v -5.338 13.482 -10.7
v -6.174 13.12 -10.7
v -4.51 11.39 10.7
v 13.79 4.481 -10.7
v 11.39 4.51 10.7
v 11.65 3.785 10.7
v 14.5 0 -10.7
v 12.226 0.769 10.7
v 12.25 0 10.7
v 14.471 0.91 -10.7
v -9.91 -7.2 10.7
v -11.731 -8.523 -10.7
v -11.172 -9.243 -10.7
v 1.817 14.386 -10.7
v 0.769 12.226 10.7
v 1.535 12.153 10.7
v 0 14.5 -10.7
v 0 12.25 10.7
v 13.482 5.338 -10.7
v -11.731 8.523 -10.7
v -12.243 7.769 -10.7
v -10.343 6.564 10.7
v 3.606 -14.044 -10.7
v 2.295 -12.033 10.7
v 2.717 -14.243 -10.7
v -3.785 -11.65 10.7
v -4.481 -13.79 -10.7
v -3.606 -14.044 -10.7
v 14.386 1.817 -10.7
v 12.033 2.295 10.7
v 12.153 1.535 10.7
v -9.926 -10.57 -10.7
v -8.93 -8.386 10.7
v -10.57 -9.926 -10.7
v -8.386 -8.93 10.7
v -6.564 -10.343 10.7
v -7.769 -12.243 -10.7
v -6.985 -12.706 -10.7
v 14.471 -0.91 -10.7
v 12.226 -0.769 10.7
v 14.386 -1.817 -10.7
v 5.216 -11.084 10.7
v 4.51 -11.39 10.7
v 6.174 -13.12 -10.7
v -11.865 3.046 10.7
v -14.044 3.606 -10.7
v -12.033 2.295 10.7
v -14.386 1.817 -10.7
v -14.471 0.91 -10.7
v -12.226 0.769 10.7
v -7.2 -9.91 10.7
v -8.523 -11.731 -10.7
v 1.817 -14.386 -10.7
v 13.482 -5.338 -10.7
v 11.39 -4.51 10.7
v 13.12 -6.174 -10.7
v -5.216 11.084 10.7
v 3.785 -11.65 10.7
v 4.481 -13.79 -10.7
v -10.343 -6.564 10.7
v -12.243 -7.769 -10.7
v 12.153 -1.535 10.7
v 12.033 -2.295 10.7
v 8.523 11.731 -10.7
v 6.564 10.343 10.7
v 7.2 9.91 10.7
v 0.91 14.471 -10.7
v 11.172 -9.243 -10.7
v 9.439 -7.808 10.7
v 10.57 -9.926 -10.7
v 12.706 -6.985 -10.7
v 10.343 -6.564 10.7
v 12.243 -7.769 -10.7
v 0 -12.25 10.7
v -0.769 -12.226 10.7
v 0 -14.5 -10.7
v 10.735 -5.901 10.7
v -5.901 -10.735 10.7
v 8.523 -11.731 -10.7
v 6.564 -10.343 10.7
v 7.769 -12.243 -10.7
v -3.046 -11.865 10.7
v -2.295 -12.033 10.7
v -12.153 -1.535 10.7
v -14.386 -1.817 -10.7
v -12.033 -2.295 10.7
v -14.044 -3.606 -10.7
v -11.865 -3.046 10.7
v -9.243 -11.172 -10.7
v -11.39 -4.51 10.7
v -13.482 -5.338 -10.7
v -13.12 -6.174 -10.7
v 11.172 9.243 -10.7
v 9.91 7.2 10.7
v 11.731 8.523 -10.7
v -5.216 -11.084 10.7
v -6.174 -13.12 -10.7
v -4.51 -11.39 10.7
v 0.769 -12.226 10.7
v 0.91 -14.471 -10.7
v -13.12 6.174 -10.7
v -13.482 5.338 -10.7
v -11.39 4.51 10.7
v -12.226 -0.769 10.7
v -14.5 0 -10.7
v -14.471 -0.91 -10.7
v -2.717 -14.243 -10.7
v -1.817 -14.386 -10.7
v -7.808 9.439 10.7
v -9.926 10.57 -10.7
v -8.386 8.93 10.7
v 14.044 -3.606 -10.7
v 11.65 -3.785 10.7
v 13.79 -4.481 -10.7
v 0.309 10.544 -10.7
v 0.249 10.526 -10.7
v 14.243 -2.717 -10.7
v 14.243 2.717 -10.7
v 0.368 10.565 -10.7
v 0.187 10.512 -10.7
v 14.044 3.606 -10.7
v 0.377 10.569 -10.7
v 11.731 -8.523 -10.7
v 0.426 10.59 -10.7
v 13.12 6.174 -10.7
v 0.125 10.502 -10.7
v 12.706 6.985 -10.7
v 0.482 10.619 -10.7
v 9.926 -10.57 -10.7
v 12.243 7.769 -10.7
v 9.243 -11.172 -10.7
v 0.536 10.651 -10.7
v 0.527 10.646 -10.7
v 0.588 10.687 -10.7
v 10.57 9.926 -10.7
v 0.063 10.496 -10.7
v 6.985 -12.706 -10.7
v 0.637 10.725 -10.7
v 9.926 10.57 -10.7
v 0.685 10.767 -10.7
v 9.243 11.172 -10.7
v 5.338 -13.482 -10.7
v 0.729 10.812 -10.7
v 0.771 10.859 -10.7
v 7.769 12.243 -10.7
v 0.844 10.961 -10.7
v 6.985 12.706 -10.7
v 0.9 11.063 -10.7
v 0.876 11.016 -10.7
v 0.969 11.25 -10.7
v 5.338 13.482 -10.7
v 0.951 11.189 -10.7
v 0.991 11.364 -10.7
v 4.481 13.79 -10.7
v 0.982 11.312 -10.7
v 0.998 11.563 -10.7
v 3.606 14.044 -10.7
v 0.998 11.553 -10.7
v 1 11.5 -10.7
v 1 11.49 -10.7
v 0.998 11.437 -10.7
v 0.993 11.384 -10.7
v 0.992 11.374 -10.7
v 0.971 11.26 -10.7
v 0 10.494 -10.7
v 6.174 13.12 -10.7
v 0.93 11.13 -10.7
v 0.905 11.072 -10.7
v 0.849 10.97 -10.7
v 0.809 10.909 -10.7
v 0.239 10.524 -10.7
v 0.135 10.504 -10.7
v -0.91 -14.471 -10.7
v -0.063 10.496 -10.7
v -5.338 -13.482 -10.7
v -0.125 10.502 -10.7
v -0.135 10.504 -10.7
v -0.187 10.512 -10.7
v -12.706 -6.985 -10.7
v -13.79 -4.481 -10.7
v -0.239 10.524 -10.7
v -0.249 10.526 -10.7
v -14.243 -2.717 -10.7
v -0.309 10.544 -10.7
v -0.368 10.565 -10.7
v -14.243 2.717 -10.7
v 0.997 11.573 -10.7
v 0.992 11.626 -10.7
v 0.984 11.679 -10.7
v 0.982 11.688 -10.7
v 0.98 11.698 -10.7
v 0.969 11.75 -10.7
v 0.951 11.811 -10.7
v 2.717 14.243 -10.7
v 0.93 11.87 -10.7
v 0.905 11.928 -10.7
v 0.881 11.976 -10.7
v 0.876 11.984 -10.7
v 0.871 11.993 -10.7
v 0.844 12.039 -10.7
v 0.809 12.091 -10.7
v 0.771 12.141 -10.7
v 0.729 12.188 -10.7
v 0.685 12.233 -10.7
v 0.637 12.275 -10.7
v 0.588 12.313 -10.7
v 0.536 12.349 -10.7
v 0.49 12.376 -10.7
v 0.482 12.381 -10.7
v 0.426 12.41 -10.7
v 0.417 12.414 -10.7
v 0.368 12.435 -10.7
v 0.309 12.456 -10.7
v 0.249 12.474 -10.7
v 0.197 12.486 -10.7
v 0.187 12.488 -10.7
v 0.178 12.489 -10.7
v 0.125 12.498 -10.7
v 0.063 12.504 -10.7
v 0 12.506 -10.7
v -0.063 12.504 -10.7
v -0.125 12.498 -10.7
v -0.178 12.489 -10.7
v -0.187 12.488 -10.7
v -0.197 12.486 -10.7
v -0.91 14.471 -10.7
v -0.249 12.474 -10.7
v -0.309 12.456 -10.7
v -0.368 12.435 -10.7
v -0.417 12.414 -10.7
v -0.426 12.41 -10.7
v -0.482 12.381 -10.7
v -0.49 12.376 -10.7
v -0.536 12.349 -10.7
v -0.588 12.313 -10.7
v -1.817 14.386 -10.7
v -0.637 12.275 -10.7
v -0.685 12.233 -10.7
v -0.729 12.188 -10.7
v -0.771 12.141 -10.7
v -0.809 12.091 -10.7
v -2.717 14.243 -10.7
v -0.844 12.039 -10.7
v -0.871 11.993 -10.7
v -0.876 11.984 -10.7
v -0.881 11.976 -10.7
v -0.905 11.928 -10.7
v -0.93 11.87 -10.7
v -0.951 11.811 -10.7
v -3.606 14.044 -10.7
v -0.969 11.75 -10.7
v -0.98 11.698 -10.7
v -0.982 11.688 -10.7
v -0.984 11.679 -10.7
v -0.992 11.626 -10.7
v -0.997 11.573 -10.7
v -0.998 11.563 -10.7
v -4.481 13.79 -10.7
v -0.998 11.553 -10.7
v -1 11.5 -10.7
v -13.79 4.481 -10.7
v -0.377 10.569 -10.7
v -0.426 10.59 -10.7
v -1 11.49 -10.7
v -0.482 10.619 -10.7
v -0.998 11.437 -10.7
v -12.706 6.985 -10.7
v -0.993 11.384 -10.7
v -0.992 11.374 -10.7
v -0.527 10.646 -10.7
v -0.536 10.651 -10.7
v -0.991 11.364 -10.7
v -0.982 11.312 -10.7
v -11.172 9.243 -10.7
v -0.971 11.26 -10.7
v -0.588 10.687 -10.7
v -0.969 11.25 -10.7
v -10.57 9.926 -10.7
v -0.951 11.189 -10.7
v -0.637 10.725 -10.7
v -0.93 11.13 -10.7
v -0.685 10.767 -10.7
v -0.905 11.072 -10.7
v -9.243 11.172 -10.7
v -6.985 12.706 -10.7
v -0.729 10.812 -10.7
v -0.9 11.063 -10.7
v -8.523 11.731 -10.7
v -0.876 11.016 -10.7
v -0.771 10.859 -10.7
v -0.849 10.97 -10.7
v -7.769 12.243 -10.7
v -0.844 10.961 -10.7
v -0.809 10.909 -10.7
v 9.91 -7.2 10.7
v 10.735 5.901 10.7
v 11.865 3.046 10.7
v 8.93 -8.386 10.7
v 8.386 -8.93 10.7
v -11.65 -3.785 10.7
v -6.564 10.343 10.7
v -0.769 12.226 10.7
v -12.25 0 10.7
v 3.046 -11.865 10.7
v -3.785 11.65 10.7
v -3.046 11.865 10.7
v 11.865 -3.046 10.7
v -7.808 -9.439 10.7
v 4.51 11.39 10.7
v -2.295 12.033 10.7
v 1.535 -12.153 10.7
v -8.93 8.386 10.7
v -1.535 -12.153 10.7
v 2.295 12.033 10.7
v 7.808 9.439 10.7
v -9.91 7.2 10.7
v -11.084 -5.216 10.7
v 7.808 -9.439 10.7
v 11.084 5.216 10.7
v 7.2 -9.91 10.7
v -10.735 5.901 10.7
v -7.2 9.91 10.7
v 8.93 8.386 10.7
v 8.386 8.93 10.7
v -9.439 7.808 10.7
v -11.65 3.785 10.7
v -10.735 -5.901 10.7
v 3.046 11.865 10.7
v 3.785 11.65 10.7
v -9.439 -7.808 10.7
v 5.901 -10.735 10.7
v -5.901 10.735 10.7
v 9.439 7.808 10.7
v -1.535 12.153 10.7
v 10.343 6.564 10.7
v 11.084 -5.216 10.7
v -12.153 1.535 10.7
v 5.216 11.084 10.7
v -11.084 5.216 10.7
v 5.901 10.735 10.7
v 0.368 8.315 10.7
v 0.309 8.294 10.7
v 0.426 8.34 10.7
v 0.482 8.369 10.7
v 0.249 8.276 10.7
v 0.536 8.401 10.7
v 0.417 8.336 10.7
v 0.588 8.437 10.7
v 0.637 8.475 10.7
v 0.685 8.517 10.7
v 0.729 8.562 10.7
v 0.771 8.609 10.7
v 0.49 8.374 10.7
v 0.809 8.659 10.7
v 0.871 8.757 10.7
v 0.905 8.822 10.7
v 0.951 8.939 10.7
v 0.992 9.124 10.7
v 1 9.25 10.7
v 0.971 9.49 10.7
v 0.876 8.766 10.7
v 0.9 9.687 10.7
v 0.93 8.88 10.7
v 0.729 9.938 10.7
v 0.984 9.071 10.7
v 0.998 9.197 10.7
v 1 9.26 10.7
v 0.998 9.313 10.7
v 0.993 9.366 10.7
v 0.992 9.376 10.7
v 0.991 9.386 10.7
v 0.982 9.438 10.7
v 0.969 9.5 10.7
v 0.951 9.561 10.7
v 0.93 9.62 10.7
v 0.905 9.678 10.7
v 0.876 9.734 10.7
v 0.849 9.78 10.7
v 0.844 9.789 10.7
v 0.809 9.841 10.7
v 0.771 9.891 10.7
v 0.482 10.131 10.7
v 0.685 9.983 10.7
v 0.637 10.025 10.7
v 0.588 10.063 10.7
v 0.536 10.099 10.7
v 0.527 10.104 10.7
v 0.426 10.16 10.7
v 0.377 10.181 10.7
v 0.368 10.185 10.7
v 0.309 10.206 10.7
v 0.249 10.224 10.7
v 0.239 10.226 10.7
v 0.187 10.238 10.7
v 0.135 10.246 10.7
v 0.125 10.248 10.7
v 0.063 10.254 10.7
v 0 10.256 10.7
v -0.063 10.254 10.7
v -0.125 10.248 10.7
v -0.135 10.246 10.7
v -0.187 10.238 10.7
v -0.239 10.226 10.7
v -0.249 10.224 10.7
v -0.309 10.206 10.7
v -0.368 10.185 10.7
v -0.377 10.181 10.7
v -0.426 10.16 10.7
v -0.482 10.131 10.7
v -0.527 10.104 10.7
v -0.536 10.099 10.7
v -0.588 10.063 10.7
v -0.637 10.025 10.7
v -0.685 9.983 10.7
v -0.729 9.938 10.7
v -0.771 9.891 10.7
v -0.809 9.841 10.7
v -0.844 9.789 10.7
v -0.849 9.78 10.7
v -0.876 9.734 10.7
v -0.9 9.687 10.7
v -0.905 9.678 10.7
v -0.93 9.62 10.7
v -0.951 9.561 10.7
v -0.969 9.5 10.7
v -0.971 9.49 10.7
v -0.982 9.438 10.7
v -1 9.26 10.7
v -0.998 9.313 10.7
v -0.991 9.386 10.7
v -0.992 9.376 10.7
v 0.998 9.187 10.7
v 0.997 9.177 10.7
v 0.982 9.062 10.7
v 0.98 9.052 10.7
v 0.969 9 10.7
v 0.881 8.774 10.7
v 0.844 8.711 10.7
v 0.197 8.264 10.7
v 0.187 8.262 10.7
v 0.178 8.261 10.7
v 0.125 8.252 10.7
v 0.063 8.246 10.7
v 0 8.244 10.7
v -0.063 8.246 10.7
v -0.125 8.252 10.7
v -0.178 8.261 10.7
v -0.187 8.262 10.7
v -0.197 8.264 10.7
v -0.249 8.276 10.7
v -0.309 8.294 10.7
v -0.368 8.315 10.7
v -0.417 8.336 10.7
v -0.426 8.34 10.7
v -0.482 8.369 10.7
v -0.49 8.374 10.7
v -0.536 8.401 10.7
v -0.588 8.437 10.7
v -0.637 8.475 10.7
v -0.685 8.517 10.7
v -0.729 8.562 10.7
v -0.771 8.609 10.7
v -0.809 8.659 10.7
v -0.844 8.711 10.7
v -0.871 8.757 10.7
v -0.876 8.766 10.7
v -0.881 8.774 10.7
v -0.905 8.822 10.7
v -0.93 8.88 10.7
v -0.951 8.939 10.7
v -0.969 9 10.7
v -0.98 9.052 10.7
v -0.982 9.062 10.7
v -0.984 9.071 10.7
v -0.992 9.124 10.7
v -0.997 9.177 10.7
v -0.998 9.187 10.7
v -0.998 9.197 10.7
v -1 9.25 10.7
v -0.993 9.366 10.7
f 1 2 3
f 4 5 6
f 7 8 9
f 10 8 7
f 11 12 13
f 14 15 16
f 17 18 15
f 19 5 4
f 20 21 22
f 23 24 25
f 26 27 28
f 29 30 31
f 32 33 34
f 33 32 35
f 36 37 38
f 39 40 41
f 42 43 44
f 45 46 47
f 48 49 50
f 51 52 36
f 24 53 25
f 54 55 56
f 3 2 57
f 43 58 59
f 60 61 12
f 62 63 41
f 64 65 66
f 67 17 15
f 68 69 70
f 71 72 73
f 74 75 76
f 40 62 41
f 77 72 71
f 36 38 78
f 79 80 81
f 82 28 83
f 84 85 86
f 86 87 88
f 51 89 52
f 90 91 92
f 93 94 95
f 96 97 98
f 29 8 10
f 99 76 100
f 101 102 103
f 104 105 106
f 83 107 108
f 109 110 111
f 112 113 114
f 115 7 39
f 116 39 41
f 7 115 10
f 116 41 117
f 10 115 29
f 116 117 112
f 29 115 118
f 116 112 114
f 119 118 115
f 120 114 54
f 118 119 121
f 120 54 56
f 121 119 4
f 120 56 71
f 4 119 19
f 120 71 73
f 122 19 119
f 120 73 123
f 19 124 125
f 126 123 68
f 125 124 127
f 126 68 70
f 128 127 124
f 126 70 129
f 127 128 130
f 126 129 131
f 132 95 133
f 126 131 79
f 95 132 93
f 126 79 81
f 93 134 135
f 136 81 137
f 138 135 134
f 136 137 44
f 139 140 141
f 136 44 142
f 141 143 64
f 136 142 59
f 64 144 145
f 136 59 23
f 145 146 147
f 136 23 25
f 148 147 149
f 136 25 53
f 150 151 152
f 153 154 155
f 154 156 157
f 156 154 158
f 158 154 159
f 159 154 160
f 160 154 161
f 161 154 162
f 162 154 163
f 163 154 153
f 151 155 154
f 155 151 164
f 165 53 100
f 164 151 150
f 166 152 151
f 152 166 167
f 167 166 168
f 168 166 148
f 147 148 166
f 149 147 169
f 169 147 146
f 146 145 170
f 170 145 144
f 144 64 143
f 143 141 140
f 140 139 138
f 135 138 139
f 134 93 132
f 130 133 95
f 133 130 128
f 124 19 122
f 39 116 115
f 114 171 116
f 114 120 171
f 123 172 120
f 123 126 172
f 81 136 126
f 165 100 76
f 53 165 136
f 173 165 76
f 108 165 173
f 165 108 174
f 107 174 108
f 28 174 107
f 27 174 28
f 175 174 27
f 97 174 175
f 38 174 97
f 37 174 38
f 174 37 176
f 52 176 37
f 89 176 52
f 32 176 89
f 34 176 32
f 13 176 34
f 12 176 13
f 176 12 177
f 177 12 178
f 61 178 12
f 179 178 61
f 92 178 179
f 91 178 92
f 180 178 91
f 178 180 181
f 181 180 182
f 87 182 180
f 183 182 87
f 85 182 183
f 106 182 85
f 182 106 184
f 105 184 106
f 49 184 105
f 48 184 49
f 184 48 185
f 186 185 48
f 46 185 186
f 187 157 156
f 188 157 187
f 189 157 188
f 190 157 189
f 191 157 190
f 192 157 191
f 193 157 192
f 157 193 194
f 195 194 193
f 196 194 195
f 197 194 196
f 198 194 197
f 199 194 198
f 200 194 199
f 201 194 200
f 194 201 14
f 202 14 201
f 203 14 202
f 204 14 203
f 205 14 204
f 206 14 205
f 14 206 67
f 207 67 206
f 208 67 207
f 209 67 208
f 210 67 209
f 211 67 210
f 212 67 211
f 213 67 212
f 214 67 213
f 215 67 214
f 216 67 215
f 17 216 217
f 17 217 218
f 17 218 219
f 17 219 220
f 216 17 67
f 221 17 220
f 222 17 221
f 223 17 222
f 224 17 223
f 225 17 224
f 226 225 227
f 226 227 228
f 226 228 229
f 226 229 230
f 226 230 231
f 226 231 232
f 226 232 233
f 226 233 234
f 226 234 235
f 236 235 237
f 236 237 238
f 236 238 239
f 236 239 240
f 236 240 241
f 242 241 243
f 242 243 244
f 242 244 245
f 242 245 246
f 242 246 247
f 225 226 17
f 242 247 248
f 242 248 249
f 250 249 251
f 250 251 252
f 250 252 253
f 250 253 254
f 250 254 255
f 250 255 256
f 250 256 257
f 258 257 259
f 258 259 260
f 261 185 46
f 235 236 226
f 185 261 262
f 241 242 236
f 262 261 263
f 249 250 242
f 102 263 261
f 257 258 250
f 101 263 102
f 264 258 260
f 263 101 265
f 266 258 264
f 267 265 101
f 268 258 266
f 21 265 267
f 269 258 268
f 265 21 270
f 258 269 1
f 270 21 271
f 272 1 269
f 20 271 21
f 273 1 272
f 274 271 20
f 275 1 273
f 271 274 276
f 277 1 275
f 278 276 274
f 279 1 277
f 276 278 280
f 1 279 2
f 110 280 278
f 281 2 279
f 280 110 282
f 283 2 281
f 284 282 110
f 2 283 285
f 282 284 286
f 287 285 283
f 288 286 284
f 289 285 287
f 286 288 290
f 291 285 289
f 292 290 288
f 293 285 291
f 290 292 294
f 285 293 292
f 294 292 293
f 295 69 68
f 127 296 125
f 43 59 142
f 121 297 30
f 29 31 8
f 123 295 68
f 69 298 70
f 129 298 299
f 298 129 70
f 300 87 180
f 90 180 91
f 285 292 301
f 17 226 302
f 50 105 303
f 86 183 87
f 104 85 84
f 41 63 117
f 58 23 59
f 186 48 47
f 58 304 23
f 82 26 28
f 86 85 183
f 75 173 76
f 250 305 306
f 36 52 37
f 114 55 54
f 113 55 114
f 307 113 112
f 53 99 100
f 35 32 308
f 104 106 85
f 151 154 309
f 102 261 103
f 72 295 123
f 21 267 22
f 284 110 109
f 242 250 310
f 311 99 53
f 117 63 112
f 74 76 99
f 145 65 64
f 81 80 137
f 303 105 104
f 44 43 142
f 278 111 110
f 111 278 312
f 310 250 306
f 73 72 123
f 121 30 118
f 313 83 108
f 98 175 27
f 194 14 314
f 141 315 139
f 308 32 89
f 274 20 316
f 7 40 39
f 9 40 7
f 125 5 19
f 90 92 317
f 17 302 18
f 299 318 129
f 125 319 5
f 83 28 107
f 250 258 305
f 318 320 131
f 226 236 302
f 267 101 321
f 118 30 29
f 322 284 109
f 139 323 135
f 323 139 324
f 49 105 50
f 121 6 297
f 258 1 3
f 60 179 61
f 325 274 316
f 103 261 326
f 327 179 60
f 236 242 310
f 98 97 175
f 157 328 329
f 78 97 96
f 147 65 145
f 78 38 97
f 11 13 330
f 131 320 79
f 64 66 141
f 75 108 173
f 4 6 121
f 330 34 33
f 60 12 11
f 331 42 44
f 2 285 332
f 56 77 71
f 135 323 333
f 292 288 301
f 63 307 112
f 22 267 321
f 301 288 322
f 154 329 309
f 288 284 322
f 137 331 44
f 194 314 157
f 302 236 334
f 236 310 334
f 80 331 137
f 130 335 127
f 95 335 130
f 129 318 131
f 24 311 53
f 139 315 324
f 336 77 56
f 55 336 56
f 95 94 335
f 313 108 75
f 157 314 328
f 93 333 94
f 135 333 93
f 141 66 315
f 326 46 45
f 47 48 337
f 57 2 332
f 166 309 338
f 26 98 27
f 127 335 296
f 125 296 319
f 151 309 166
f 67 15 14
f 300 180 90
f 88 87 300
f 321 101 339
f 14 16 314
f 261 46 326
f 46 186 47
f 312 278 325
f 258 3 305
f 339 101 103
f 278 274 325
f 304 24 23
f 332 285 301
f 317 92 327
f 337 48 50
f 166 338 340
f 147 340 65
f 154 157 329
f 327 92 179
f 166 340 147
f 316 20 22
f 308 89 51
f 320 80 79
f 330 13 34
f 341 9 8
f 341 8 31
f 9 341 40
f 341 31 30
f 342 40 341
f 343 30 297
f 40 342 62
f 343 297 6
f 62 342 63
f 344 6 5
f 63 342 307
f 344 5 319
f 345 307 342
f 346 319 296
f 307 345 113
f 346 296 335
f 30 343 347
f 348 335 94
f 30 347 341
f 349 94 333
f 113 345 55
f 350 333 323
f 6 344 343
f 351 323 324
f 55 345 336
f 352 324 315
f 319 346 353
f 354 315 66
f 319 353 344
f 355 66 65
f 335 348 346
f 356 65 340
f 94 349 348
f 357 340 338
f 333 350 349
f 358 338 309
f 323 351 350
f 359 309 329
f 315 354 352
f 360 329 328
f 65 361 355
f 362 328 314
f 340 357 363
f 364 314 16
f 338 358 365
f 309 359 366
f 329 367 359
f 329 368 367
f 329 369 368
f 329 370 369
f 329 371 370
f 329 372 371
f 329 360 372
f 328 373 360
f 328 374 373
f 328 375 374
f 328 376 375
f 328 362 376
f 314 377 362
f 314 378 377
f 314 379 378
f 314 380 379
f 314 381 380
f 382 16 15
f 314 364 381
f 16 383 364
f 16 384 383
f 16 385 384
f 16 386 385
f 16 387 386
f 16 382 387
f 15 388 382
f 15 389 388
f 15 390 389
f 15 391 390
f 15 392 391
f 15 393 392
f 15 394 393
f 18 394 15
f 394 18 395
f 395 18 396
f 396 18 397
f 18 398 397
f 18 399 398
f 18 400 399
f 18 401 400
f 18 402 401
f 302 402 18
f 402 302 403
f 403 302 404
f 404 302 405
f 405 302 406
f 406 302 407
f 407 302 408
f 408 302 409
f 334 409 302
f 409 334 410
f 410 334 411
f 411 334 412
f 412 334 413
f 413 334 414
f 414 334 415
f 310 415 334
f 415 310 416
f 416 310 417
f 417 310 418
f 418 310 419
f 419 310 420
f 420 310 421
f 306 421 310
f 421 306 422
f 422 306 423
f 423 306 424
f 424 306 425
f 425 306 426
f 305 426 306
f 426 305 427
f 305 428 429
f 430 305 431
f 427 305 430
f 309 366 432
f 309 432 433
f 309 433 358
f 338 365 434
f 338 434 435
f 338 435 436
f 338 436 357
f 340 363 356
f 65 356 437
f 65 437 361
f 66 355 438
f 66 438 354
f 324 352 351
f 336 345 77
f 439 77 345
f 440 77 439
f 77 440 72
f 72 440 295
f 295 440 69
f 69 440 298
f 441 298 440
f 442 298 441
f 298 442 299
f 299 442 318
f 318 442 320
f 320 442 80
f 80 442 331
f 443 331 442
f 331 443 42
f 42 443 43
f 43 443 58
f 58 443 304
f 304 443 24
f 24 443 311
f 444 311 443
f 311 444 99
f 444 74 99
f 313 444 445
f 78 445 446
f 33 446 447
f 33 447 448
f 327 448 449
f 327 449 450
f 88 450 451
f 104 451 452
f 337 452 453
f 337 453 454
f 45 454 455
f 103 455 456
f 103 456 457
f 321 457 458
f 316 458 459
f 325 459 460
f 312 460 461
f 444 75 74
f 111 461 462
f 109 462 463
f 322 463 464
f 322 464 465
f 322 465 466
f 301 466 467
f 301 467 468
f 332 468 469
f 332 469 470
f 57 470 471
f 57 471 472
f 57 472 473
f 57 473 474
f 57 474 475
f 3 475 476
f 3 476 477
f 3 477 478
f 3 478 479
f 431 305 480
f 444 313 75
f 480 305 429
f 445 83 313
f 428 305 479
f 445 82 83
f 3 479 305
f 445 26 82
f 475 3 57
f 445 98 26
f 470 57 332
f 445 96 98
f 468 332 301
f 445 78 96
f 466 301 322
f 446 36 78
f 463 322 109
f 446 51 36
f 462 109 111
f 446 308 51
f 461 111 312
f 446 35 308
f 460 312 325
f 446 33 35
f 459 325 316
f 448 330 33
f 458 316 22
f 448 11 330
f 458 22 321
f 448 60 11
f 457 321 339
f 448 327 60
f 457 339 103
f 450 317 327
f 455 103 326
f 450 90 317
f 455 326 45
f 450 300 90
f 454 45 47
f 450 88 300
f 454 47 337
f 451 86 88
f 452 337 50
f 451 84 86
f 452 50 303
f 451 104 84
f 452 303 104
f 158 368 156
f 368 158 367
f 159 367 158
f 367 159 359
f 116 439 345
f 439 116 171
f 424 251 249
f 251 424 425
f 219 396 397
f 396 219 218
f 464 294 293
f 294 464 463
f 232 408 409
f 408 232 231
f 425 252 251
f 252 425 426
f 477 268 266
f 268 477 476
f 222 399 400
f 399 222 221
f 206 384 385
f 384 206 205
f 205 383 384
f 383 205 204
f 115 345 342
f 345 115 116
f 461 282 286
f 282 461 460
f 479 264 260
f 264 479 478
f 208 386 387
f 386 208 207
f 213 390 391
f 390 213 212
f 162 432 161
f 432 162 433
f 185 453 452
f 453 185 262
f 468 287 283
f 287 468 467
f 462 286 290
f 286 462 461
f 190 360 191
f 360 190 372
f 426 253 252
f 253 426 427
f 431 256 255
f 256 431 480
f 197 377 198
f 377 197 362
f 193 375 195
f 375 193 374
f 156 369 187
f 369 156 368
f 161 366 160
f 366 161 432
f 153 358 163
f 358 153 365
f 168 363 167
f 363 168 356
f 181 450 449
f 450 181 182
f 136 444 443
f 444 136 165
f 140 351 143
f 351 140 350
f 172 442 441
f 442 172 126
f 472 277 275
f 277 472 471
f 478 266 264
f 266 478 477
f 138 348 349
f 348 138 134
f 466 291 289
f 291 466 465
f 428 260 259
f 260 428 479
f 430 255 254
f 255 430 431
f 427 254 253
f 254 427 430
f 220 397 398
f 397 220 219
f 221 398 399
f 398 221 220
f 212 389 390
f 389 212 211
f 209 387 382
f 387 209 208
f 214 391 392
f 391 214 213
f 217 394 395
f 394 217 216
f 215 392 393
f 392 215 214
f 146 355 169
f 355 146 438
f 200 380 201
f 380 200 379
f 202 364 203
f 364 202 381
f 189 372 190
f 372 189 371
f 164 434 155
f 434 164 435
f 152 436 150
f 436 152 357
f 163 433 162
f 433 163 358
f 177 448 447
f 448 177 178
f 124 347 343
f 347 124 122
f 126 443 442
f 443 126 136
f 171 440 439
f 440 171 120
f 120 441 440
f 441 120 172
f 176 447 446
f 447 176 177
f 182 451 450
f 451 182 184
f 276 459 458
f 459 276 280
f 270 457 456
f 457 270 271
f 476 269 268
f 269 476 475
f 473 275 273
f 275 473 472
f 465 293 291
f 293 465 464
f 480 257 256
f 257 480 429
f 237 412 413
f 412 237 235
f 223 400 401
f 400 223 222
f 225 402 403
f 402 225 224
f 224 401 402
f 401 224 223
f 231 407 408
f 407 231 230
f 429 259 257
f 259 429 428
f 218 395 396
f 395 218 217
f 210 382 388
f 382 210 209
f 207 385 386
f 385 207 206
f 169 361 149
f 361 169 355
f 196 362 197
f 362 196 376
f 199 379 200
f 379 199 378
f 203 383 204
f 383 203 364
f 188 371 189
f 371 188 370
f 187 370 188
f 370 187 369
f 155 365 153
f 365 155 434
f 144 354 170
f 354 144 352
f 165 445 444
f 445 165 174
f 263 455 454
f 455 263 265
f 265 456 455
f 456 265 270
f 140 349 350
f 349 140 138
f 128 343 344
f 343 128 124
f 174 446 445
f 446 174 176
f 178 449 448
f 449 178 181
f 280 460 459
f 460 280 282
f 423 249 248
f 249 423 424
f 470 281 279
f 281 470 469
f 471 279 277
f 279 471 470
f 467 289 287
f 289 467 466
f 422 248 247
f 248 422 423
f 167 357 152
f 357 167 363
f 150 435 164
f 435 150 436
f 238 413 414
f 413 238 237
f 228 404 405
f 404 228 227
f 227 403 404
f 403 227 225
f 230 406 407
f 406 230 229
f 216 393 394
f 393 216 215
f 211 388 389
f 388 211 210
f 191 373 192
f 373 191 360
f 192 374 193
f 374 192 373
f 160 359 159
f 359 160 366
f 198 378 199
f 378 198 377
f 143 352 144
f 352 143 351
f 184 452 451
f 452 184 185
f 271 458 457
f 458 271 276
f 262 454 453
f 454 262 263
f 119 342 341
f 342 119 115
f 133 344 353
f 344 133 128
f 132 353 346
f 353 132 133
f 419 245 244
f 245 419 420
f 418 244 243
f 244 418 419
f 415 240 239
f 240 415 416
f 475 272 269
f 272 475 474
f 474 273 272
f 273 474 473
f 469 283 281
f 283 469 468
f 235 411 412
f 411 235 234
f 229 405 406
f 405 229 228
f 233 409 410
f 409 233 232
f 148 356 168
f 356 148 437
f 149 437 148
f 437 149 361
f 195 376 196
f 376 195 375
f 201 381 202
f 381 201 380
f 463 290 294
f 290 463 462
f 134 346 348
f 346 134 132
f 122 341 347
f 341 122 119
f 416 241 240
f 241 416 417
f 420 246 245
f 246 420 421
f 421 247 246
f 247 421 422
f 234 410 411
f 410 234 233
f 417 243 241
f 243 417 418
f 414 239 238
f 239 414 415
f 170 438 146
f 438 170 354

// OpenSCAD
$fn=100*1;

//larger width radius (half the diameter)
radius1=14.5; 

//shorter width radius (half the diameter)
radius2=12.25; 

// height
height=21.4; 

//angle for the air hole
angle=atan((radius1-radius2)/height);

difference(){
	cylinder(h=height,r1=radius1, r2=radius2, center=true);
		translate([0,(radius1+radius2)/2-3,0])rotate([angle,0,0])cylinder(h=height+10,r=1, center=true);

}
